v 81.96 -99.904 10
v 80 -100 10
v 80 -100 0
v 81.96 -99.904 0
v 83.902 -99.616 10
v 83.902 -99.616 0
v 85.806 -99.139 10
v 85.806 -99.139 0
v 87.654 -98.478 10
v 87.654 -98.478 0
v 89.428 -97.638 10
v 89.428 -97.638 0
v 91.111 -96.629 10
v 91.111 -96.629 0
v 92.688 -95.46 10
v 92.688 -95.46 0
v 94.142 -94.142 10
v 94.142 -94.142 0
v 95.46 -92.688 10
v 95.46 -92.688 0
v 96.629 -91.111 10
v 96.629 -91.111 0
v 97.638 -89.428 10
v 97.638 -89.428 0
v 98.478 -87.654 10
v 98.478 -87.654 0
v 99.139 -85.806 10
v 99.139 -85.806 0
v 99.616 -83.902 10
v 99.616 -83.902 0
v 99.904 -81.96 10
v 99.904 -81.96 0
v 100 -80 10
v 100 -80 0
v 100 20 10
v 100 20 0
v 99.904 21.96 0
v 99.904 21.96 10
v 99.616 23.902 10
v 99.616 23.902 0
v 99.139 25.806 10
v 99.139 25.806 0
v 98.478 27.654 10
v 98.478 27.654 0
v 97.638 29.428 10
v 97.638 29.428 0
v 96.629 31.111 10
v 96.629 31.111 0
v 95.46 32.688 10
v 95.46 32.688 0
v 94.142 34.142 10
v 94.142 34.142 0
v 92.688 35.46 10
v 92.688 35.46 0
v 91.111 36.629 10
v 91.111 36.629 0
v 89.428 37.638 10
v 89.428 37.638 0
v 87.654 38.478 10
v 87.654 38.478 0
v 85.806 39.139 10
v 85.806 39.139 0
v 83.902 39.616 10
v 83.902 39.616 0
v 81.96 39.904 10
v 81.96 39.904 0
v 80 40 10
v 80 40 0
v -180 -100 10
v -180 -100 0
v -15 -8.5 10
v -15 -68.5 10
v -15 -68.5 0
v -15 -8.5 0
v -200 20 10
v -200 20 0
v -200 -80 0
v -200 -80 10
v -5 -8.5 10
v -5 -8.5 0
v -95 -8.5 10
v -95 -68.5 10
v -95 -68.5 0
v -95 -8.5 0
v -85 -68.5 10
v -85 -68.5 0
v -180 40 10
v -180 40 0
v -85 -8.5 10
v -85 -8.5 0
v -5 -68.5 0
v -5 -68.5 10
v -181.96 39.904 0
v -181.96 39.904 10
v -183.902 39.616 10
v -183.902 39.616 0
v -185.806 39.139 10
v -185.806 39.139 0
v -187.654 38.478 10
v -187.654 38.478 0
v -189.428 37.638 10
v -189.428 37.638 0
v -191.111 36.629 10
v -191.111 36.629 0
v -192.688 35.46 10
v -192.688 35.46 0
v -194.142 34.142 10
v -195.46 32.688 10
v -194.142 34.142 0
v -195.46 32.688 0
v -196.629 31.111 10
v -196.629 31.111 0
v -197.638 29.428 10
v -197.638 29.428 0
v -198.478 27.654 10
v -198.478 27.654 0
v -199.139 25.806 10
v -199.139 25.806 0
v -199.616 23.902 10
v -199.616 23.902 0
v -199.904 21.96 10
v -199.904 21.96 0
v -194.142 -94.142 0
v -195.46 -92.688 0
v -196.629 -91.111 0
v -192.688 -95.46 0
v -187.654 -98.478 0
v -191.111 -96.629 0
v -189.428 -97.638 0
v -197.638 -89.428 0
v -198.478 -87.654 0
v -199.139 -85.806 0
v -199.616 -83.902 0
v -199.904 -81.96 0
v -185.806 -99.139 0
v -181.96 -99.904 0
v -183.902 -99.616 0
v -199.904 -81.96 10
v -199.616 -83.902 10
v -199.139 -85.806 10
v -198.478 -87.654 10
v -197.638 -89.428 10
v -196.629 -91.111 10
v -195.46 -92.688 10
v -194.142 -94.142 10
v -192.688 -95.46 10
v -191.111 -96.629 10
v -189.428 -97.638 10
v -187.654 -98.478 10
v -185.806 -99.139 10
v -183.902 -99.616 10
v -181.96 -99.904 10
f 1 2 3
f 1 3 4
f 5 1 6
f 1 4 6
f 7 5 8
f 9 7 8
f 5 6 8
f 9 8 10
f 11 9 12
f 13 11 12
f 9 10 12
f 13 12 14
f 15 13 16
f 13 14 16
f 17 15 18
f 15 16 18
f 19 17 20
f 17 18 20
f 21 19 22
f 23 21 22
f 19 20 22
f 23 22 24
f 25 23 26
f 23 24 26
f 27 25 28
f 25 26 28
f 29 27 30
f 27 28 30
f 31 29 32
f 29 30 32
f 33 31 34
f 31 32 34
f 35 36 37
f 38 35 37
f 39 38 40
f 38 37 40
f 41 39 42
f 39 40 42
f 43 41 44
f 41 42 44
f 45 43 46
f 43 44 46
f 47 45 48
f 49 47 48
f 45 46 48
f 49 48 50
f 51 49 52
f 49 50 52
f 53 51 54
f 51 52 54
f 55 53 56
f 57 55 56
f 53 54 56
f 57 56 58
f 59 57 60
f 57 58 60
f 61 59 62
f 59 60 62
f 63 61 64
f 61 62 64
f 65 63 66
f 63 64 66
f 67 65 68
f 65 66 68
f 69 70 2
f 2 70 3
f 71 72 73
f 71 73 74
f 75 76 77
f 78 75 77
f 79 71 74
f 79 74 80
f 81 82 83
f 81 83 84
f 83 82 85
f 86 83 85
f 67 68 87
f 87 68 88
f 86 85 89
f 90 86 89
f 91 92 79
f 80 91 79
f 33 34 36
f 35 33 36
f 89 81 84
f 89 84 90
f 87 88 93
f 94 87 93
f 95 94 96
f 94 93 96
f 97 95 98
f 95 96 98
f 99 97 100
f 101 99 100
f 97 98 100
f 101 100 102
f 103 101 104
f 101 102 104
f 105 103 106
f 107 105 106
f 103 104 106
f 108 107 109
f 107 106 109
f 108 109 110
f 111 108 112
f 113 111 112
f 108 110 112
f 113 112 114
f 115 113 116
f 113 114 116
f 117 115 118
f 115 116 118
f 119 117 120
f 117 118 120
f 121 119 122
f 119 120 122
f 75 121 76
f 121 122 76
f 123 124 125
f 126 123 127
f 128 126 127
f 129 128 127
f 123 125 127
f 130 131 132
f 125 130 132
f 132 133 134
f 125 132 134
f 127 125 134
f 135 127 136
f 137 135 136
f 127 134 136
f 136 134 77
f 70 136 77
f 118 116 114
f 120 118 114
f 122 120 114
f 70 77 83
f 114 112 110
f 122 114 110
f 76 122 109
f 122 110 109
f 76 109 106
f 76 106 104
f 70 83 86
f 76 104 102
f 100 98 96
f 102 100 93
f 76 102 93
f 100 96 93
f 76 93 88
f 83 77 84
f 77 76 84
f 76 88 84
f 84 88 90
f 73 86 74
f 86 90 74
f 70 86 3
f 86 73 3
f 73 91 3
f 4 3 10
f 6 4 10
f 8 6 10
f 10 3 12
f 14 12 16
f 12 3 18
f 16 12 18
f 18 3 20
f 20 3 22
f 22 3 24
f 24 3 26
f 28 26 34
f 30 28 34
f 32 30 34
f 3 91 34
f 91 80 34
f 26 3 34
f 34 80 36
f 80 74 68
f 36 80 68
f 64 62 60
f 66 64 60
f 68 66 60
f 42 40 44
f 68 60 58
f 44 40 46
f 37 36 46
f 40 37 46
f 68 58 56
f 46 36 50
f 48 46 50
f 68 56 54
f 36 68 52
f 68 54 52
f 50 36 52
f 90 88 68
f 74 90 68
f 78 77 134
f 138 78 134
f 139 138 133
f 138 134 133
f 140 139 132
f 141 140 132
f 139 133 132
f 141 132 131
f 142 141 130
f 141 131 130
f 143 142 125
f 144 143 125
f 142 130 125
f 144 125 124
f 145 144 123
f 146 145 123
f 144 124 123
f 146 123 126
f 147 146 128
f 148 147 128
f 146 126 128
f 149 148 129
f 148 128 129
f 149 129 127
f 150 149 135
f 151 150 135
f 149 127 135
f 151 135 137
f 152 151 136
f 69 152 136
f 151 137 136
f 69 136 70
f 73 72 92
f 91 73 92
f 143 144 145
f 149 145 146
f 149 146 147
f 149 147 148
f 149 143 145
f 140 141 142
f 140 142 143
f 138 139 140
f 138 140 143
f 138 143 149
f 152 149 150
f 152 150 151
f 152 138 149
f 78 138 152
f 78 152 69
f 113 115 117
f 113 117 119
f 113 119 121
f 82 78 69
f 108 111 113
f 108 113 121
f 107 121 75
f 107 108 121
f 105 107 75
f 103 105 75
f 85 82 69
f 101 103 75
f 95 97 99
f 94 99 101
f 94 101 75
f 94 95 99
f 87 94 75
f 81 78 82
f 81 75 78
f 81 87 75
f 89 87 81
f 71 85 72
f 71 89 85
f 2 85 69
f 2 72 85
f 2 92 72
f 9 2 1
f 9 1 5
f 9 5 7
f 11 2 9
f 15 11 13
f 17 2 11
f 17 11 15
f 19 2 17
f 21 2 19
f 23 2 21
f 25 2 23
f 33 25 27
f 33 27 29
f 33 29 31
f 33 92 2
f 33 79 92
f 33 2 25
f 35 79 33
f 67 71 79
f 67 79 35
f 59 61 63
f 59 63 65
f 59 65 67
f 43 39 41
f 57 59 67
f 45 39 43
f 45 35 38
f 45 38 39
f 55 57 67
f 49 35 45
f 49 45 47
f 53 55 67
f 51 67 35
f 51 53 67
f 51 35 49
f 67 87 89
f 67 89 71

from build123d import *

# Parameters (mm, degrees)
BOSS_EXTRUDE1_DEPTH = 10
SKETCH2_W           = 10
SKETCH2_H           = 60
CUT_EXTRUDE1_DEPTH  = 10


with BuildPart() as part:
    # Sketch1 → Boss-Extrude1 (new body)
    with BuildSketch(Plane.XY):
        with BuildLine():
            Line((80, 40), (-180, 40))
            ThreePointArc((-180, 40), (-194.142135624, 34.142135624), (-200, 20))
            Line((-200, 20), (-200, -80))
            ThreePointArc((-200, -80), (-194.142135624, -94.142135624), (-180, -100))
            Line((-180, -100), (80, -100))
            ThreePointArc((80, -100), (94.142135624, -94.142135624), (100, -80))
            Line((100, -80), (100, 20))
            ThreePointArc((100, 20), (94.142135624, 34.142135624), (80, 40))
        make_face()
    extrude(amount=BOSS_EXTRUDE1_DEPTH)

    # Sketch2 → Cut-Extrude1 (cut)
    with BuildSketch(Plane.XY.offset(10)):
        with Locations((-90, -38.5)):
            Rectangle(SKETCH2_W, SKETCH2_H)
        with Locations((-10, -38.5)):
            Rectangle(SKETCH2_W, SKETCH2_H)
    extrude(amount=-CUT_EXTRUDE1_DEPTH, mode=Mode.SUBTRACT)


solid = part.part
